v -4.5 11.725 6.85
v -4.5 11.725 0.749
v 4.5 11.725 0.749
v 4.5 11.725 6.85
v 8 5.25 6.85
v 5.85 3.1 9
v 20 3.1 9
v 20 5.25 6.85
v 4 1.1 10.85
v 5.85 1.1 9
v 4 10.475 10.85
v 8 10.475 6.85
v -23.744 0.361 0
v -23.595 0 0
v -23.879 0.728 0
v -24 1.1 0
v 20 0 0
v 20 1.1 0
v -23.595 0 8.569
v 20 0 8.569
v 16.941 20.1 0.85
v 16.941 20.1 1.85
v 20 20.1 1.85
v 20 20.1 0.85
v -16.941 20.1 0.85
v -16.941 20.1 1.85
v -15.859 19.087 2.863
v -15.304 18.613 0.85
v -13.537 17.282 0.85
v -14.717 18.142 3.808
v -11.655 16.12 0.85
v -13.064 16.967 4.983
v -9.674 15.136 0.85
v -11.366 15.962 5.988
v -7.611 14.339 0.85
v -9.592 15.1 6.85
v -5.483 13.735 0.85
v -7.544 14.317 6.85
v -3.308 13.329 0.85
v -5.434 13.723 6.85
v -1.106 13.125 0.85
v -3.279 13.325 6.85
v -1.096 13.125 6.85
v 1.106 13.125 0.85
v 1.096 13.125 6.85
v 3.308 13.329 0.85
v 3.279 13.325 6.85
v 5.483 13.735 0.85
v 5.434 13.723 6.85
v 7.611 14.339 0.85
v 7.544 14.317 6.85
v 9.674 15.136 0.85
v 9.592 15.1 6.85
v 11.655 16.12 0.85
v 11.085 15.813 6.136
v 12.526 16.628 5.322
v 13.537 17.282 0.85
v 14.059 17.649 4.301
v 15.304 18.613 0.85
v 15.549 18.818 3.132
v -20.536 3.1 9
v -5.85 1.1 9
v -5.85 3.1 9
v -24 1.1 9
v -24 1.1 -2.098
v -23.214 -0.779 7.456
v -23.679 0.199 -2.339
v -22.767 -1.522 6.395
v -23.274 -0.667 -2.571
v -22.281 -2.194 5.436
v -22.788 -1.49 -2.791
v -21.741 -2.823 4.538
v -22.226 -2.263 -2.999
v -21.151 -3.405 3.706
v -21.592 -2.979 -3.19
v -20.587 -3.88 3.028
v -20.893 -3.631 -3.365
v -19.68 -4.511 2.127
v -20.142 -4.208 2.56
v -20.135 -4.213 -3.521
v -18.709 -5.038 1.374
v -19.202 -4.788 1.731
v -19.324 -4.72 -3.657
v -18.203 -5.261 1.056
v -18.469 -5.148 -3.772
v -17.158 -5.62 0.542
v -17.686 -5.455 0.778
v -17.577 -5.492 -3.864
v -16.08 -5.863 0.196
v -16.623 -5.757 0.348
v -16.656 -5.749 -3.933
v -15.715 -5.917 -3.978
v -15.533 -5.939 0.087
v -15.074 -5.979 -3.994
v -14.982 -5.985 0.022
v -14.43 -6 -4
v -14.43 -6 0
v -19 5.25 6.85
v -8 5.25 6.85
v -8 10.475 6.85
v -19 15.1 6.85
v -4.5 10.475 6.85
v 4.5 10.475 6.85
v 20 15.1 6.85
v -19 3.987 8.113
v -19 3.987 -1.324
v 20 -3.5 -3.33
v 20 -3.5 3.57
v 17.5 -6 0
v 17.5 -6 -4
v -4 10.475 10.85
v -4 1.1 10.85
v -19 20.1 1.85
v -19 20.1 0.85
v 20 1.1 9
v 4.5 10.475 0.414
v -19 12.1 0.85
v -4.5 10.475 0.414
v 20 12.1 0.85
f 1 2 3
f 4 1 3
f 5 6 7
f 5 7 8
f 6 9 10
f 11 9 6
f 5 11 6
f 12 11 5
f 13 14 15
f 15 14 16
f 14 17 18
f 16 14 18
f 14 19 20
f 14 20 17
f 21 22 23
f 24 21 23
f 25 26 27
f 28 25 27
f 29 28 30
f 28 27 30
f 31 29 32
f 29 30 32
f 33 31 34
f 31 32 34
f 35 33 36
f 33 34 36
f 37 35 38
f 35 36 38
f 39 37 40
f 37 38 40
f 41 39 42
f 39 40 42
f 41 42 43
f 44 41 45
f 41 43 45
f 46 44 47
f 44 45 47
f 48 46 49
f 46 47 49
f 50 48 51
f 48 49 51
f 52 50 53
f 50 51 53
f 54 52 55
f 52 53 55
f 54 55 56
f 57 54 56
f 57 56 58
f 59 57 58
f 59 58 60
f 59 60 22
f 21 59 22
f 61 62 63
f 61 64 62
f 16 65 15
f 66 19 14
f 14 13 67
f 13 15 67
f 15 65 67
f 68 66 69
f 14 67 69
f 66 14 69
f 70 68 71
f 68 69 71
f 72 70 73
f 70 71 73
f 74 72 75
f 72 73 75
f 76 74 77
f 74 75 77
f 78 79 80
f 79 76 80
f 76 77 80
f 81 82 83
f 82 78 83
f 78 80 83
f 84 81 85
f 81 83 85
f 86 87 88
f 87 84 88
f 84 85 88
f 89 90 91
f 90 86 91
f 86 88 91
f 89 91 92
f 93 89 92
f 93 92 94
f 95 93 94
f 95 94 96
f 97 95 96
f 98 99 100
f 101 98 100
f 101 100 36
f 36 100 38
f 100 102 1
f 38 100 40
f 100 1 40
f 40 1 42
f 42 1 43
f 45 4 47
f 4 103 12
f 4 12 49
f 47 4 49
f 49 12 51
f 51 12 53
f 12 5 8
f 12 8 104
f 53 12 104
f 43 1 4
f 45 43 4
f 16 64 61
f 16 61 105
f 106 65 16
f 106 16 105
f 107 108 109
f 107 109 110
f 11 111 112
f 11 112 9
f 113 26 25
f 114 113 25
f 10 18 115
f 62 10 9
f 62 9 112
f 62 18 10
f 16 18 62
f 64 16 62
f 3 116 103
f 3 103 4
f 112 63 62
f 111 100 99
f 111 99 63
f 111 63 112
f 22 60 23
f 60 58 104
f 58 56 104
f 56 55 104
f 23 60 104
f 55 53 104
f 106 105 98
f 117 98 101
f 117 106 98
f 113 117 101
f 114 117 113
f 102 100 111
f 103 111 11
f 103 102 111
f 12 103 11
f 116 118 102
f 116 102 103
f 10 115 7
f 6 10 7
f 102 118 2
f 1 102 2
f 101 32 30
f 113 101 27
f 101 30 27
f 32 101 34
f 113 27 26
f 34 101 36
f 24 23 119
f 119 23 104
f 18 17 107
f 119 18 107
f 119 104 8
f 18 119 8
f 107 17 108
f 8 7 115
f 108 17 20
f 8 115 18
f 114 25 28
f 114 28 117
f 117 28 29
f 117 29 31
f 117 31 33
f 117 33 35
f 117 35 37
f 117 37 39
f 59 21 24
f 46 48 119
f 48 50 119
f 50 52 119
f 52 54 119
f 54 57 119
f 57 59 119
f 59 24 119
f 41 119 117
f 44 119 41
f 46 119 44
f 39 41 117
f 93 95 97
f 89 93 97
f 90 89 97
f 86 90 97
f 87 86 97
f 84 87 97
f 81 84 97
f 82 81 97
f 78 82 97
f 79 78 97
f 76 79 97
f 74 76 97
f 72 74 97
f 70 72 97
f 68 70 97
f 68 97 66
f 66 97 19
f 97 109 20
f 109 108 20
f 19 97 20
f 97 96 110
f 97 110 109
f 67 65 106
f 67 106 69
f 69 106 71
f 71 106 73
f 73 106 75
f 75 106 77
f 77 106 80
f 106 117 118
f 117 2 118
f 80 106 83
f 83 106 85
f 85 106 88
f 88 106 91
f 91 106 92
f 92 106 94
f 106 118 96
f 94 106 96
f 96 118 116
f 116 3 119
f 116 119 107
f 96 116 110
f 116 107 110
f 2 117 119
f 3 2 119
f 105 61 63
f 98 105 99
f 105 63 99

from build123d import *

# Parameters (mm, degrees)
BOSS_EXTRUDE1_DEPTH     = 20
BOSS_EXTRUDE4_DEPTH     = 6
CHAMFER4_SIZE           = 5
BOSS_EXTRUDE5_DEPTH     = 4
CUT_EXTRUDE4_DEPTH      = 33.573148451
CUT_EXTRUDE4_DEPTH_BACK = 33.573148451
FILLET1_R               = 10
CHAMFER5_SIZE           = 2.5
SKETCH17_W              = 9
SKETCH17_H              = 1.25
CUT_EXTRUDE5_DEPTH      = 33.573148451
SKETCH18_W              = 8
SKETCH18_H              = 9.375
BOSS_EXTRUDE6_DEPTH     = 4
BOSS_EXTRUDE8_REACH     = 33.067


with BuildPart() as part:
    # Sketch1 → Boss-Extrude1 (new, symmetric)
    with BuildSketch(Plane(origin=(0, 0, 0), x_dir=(0, 0, -1), z_dir=(1, 0, 0))):
        Polygon((0, -6), (4, -6), (-0.849880383, 12.1), (-6.849880383, 12.1), (-6.849880383, 5.250119617), (-9, 3.1), (-9, 1.1), (0, 1.1), (0, 0), (-8.56888804, 0), align=None)
    extrude(amount=BOSS_EXTRUDE1_DEPTH, both=True)

    # Sketch7 → Boss-Extrude4 (add)
    with BuildSketch(Plane.XY.offset(6.849880383)):
        with BuildLine():
            Line((-20, 12.1), (-20, 20.1))
            Line((-20, 20.1), (-16.941074346, 20.1))
            ThreePointArc((-16.941074346, 20.1), (0, 13.1), (16.941074346, 20.1))
            Line((16.941074346, 20.1), (20, 20.1))
            Line((20, 20.1), (20, 12.1))
            Line((20, 12.1), (-20, 12.1))
        make_face()
    extrude(amount=-BOSS_EXTRUDE4_DEPTH)

    # Chamfer4
    chamfer4_edges = [part.edges().sort_by_distance(p)[0] for p in [
        (-18.470537173, 20.1, 6.849880383),
        (18.470537173, 20.1, 6.849880383),
    ]]
    chamfer(chamfer4_edges, length=CHAMFER4_SIZE)

    # Sketch15 → Boss-Extrude5 (add)
    with BuildSketch(Plane.ZY.offset(20)):
        Polygon((9, 1.1), (9, 3.1), (6.849880383, 5.250119617), (6.849880383, 15.1), (1.849880383, 20.1), (0.849880383, 20.1), (0.849880383, 12.1), (-4, -6), (0, -6), (8.56888804, 0), (0, 0), (0, 1.1), align=None)
    extrude(amount=BOSS_EXTRUDE5_DEPTH)

    # Sketch16 → Cut-Extrude4 (cut, two sides: drawn at the far end of the back side and taken through both)
    with BuildSketch(Plane.XY.offset(-CUT_EXTRUDE4_DEPTH_BACK)):
        Polygon((-24, 1.1), (-19, 3.986751346), (-19, 20.1), (-24, 20.1), align=None)
    extrude(amount=CUT_EXTRUDE4_DEPTH + CUT_EXTRUDE4_DEPTH_BACK, mode=Mode.SUBTRACT)

    # Fillet1
    # the kernel refuses this fillet: 10 mm, written as the material it takes off along each edge
    with BuildSketch(Plane(origin=(-24, -6, -27.925666135), x_dir=(1, 0, 0), z_dir=(0, 0, 1))) as fillet1_piece_1:
        with BuildLine():
            CenterArc((9.570266454, 10), FILLET1_R, 196.857956022, 73.142043978)
            Line((0, 7.1), (-0.191405329, 7.042))
            ThreePointArc((-0.191405329, 7.042), (-0.2, 3.55), (-0.2, 0))
            Line((-0.2, 0), (0, -0.2))
            Line((0, -0.2), (9.570266454, -0.2))
            Line((9.570266454, -0.2), (9.570266454, 0))
        make_face()
    extrude(amount=51.85133227, mode=Mode.SUBTRACT)

    # Chamfer5
    chamfer5_edges = [part.edges().sort_by_distance(p)[0] for p in [
        (20, -6, -2),
    ]]
    chamfer(chamfer5_edges, length=CHAMFER5_SIZE)

    # Sketch17 → Cut-Extrude5 (cut, through all)
    with BuildSketch(Plane.XY):
        with Locations((0, 11.1)):
            Rectangle(SKETCH17_W, SKETCH17_H)
    extrude(amount=CUT_EXTRUDE5_DEPTH, mode=Mode.SUBTRACT)

    # Sketch18 → Boss-Extrude6 (add)
    with BuildSketch(Plane.XY.offset(6.849880383)):
        with Locations((0, 5.7875)):
            Rectangle(SKETCH18_W, SKETCH18_H)
    extrude(amount=BOSS_EXTRUDE6_DEPTH)

    # Boss-Extrude8: up to this face of the body (flat: up to its plane)
    boss_extrude8_end = Plane(part.part.faces().sort_by_distance((-1.927949963, 1.1, 4.69543357))[0])
    # Sketch19 → Boss-Extrude8 (add, up to the picked face)
    with BuildSketch(Plane(origin=(0, 10.475, 0), x_dir=(1, 0, 0), z_dir=(0, 1, 0)), mode=Mode.PRIVATE) as boss_extrude8_sk1:
        Polygon((4, -6.849880383), (4, -10.849880383), (8, -6.849880383), align=None)
    boss_extrude8_tool1 = split(extrude(boss_extrude8_sk1.sketch, amount=-BOSS_EXTRUDE8_REACH, mode=Mode.PRIVATE), bisect_by=boss_extrude8_end, keep=Keep.BOTH, mode=Mode.PRIVATE)
    # Sketch19 → Boss-Extrude8 (add, up to the picked face)
    with BuildSketch(Plane(origin=(0, 10.475, 0), x_dir=(1, 0, 0), z_dir=(0, 1, 0)), mode=Mode.PRIVATE) as boss_extrude8_sk2:
        Polygon((-4, -6.849880383), (-8, -6.849880383), (-4, -10.849880383), align=None)
    boss_extrude8_tool2 = split(extrude(boss_extrude8_sk2.sketch, amount=-BOSS_EXTRUDE8_REACH, mode=Mode.PRIVATE), bisect_by=boss_extrude8_end, keep=Keep.BOTH, mode=Mode.PRIVATE)
    add(boss_extrude8_tool1.solids().sort_by(Axis((5.333333, 10.475, 8.183214), (0, -1, 0)))[0])
    add(boss_extrude8_tool2.solids().sort_by(Axis((-5.333333, 10.475, 8.183214), (0, -1, 0)))[0])


solid = part.part
